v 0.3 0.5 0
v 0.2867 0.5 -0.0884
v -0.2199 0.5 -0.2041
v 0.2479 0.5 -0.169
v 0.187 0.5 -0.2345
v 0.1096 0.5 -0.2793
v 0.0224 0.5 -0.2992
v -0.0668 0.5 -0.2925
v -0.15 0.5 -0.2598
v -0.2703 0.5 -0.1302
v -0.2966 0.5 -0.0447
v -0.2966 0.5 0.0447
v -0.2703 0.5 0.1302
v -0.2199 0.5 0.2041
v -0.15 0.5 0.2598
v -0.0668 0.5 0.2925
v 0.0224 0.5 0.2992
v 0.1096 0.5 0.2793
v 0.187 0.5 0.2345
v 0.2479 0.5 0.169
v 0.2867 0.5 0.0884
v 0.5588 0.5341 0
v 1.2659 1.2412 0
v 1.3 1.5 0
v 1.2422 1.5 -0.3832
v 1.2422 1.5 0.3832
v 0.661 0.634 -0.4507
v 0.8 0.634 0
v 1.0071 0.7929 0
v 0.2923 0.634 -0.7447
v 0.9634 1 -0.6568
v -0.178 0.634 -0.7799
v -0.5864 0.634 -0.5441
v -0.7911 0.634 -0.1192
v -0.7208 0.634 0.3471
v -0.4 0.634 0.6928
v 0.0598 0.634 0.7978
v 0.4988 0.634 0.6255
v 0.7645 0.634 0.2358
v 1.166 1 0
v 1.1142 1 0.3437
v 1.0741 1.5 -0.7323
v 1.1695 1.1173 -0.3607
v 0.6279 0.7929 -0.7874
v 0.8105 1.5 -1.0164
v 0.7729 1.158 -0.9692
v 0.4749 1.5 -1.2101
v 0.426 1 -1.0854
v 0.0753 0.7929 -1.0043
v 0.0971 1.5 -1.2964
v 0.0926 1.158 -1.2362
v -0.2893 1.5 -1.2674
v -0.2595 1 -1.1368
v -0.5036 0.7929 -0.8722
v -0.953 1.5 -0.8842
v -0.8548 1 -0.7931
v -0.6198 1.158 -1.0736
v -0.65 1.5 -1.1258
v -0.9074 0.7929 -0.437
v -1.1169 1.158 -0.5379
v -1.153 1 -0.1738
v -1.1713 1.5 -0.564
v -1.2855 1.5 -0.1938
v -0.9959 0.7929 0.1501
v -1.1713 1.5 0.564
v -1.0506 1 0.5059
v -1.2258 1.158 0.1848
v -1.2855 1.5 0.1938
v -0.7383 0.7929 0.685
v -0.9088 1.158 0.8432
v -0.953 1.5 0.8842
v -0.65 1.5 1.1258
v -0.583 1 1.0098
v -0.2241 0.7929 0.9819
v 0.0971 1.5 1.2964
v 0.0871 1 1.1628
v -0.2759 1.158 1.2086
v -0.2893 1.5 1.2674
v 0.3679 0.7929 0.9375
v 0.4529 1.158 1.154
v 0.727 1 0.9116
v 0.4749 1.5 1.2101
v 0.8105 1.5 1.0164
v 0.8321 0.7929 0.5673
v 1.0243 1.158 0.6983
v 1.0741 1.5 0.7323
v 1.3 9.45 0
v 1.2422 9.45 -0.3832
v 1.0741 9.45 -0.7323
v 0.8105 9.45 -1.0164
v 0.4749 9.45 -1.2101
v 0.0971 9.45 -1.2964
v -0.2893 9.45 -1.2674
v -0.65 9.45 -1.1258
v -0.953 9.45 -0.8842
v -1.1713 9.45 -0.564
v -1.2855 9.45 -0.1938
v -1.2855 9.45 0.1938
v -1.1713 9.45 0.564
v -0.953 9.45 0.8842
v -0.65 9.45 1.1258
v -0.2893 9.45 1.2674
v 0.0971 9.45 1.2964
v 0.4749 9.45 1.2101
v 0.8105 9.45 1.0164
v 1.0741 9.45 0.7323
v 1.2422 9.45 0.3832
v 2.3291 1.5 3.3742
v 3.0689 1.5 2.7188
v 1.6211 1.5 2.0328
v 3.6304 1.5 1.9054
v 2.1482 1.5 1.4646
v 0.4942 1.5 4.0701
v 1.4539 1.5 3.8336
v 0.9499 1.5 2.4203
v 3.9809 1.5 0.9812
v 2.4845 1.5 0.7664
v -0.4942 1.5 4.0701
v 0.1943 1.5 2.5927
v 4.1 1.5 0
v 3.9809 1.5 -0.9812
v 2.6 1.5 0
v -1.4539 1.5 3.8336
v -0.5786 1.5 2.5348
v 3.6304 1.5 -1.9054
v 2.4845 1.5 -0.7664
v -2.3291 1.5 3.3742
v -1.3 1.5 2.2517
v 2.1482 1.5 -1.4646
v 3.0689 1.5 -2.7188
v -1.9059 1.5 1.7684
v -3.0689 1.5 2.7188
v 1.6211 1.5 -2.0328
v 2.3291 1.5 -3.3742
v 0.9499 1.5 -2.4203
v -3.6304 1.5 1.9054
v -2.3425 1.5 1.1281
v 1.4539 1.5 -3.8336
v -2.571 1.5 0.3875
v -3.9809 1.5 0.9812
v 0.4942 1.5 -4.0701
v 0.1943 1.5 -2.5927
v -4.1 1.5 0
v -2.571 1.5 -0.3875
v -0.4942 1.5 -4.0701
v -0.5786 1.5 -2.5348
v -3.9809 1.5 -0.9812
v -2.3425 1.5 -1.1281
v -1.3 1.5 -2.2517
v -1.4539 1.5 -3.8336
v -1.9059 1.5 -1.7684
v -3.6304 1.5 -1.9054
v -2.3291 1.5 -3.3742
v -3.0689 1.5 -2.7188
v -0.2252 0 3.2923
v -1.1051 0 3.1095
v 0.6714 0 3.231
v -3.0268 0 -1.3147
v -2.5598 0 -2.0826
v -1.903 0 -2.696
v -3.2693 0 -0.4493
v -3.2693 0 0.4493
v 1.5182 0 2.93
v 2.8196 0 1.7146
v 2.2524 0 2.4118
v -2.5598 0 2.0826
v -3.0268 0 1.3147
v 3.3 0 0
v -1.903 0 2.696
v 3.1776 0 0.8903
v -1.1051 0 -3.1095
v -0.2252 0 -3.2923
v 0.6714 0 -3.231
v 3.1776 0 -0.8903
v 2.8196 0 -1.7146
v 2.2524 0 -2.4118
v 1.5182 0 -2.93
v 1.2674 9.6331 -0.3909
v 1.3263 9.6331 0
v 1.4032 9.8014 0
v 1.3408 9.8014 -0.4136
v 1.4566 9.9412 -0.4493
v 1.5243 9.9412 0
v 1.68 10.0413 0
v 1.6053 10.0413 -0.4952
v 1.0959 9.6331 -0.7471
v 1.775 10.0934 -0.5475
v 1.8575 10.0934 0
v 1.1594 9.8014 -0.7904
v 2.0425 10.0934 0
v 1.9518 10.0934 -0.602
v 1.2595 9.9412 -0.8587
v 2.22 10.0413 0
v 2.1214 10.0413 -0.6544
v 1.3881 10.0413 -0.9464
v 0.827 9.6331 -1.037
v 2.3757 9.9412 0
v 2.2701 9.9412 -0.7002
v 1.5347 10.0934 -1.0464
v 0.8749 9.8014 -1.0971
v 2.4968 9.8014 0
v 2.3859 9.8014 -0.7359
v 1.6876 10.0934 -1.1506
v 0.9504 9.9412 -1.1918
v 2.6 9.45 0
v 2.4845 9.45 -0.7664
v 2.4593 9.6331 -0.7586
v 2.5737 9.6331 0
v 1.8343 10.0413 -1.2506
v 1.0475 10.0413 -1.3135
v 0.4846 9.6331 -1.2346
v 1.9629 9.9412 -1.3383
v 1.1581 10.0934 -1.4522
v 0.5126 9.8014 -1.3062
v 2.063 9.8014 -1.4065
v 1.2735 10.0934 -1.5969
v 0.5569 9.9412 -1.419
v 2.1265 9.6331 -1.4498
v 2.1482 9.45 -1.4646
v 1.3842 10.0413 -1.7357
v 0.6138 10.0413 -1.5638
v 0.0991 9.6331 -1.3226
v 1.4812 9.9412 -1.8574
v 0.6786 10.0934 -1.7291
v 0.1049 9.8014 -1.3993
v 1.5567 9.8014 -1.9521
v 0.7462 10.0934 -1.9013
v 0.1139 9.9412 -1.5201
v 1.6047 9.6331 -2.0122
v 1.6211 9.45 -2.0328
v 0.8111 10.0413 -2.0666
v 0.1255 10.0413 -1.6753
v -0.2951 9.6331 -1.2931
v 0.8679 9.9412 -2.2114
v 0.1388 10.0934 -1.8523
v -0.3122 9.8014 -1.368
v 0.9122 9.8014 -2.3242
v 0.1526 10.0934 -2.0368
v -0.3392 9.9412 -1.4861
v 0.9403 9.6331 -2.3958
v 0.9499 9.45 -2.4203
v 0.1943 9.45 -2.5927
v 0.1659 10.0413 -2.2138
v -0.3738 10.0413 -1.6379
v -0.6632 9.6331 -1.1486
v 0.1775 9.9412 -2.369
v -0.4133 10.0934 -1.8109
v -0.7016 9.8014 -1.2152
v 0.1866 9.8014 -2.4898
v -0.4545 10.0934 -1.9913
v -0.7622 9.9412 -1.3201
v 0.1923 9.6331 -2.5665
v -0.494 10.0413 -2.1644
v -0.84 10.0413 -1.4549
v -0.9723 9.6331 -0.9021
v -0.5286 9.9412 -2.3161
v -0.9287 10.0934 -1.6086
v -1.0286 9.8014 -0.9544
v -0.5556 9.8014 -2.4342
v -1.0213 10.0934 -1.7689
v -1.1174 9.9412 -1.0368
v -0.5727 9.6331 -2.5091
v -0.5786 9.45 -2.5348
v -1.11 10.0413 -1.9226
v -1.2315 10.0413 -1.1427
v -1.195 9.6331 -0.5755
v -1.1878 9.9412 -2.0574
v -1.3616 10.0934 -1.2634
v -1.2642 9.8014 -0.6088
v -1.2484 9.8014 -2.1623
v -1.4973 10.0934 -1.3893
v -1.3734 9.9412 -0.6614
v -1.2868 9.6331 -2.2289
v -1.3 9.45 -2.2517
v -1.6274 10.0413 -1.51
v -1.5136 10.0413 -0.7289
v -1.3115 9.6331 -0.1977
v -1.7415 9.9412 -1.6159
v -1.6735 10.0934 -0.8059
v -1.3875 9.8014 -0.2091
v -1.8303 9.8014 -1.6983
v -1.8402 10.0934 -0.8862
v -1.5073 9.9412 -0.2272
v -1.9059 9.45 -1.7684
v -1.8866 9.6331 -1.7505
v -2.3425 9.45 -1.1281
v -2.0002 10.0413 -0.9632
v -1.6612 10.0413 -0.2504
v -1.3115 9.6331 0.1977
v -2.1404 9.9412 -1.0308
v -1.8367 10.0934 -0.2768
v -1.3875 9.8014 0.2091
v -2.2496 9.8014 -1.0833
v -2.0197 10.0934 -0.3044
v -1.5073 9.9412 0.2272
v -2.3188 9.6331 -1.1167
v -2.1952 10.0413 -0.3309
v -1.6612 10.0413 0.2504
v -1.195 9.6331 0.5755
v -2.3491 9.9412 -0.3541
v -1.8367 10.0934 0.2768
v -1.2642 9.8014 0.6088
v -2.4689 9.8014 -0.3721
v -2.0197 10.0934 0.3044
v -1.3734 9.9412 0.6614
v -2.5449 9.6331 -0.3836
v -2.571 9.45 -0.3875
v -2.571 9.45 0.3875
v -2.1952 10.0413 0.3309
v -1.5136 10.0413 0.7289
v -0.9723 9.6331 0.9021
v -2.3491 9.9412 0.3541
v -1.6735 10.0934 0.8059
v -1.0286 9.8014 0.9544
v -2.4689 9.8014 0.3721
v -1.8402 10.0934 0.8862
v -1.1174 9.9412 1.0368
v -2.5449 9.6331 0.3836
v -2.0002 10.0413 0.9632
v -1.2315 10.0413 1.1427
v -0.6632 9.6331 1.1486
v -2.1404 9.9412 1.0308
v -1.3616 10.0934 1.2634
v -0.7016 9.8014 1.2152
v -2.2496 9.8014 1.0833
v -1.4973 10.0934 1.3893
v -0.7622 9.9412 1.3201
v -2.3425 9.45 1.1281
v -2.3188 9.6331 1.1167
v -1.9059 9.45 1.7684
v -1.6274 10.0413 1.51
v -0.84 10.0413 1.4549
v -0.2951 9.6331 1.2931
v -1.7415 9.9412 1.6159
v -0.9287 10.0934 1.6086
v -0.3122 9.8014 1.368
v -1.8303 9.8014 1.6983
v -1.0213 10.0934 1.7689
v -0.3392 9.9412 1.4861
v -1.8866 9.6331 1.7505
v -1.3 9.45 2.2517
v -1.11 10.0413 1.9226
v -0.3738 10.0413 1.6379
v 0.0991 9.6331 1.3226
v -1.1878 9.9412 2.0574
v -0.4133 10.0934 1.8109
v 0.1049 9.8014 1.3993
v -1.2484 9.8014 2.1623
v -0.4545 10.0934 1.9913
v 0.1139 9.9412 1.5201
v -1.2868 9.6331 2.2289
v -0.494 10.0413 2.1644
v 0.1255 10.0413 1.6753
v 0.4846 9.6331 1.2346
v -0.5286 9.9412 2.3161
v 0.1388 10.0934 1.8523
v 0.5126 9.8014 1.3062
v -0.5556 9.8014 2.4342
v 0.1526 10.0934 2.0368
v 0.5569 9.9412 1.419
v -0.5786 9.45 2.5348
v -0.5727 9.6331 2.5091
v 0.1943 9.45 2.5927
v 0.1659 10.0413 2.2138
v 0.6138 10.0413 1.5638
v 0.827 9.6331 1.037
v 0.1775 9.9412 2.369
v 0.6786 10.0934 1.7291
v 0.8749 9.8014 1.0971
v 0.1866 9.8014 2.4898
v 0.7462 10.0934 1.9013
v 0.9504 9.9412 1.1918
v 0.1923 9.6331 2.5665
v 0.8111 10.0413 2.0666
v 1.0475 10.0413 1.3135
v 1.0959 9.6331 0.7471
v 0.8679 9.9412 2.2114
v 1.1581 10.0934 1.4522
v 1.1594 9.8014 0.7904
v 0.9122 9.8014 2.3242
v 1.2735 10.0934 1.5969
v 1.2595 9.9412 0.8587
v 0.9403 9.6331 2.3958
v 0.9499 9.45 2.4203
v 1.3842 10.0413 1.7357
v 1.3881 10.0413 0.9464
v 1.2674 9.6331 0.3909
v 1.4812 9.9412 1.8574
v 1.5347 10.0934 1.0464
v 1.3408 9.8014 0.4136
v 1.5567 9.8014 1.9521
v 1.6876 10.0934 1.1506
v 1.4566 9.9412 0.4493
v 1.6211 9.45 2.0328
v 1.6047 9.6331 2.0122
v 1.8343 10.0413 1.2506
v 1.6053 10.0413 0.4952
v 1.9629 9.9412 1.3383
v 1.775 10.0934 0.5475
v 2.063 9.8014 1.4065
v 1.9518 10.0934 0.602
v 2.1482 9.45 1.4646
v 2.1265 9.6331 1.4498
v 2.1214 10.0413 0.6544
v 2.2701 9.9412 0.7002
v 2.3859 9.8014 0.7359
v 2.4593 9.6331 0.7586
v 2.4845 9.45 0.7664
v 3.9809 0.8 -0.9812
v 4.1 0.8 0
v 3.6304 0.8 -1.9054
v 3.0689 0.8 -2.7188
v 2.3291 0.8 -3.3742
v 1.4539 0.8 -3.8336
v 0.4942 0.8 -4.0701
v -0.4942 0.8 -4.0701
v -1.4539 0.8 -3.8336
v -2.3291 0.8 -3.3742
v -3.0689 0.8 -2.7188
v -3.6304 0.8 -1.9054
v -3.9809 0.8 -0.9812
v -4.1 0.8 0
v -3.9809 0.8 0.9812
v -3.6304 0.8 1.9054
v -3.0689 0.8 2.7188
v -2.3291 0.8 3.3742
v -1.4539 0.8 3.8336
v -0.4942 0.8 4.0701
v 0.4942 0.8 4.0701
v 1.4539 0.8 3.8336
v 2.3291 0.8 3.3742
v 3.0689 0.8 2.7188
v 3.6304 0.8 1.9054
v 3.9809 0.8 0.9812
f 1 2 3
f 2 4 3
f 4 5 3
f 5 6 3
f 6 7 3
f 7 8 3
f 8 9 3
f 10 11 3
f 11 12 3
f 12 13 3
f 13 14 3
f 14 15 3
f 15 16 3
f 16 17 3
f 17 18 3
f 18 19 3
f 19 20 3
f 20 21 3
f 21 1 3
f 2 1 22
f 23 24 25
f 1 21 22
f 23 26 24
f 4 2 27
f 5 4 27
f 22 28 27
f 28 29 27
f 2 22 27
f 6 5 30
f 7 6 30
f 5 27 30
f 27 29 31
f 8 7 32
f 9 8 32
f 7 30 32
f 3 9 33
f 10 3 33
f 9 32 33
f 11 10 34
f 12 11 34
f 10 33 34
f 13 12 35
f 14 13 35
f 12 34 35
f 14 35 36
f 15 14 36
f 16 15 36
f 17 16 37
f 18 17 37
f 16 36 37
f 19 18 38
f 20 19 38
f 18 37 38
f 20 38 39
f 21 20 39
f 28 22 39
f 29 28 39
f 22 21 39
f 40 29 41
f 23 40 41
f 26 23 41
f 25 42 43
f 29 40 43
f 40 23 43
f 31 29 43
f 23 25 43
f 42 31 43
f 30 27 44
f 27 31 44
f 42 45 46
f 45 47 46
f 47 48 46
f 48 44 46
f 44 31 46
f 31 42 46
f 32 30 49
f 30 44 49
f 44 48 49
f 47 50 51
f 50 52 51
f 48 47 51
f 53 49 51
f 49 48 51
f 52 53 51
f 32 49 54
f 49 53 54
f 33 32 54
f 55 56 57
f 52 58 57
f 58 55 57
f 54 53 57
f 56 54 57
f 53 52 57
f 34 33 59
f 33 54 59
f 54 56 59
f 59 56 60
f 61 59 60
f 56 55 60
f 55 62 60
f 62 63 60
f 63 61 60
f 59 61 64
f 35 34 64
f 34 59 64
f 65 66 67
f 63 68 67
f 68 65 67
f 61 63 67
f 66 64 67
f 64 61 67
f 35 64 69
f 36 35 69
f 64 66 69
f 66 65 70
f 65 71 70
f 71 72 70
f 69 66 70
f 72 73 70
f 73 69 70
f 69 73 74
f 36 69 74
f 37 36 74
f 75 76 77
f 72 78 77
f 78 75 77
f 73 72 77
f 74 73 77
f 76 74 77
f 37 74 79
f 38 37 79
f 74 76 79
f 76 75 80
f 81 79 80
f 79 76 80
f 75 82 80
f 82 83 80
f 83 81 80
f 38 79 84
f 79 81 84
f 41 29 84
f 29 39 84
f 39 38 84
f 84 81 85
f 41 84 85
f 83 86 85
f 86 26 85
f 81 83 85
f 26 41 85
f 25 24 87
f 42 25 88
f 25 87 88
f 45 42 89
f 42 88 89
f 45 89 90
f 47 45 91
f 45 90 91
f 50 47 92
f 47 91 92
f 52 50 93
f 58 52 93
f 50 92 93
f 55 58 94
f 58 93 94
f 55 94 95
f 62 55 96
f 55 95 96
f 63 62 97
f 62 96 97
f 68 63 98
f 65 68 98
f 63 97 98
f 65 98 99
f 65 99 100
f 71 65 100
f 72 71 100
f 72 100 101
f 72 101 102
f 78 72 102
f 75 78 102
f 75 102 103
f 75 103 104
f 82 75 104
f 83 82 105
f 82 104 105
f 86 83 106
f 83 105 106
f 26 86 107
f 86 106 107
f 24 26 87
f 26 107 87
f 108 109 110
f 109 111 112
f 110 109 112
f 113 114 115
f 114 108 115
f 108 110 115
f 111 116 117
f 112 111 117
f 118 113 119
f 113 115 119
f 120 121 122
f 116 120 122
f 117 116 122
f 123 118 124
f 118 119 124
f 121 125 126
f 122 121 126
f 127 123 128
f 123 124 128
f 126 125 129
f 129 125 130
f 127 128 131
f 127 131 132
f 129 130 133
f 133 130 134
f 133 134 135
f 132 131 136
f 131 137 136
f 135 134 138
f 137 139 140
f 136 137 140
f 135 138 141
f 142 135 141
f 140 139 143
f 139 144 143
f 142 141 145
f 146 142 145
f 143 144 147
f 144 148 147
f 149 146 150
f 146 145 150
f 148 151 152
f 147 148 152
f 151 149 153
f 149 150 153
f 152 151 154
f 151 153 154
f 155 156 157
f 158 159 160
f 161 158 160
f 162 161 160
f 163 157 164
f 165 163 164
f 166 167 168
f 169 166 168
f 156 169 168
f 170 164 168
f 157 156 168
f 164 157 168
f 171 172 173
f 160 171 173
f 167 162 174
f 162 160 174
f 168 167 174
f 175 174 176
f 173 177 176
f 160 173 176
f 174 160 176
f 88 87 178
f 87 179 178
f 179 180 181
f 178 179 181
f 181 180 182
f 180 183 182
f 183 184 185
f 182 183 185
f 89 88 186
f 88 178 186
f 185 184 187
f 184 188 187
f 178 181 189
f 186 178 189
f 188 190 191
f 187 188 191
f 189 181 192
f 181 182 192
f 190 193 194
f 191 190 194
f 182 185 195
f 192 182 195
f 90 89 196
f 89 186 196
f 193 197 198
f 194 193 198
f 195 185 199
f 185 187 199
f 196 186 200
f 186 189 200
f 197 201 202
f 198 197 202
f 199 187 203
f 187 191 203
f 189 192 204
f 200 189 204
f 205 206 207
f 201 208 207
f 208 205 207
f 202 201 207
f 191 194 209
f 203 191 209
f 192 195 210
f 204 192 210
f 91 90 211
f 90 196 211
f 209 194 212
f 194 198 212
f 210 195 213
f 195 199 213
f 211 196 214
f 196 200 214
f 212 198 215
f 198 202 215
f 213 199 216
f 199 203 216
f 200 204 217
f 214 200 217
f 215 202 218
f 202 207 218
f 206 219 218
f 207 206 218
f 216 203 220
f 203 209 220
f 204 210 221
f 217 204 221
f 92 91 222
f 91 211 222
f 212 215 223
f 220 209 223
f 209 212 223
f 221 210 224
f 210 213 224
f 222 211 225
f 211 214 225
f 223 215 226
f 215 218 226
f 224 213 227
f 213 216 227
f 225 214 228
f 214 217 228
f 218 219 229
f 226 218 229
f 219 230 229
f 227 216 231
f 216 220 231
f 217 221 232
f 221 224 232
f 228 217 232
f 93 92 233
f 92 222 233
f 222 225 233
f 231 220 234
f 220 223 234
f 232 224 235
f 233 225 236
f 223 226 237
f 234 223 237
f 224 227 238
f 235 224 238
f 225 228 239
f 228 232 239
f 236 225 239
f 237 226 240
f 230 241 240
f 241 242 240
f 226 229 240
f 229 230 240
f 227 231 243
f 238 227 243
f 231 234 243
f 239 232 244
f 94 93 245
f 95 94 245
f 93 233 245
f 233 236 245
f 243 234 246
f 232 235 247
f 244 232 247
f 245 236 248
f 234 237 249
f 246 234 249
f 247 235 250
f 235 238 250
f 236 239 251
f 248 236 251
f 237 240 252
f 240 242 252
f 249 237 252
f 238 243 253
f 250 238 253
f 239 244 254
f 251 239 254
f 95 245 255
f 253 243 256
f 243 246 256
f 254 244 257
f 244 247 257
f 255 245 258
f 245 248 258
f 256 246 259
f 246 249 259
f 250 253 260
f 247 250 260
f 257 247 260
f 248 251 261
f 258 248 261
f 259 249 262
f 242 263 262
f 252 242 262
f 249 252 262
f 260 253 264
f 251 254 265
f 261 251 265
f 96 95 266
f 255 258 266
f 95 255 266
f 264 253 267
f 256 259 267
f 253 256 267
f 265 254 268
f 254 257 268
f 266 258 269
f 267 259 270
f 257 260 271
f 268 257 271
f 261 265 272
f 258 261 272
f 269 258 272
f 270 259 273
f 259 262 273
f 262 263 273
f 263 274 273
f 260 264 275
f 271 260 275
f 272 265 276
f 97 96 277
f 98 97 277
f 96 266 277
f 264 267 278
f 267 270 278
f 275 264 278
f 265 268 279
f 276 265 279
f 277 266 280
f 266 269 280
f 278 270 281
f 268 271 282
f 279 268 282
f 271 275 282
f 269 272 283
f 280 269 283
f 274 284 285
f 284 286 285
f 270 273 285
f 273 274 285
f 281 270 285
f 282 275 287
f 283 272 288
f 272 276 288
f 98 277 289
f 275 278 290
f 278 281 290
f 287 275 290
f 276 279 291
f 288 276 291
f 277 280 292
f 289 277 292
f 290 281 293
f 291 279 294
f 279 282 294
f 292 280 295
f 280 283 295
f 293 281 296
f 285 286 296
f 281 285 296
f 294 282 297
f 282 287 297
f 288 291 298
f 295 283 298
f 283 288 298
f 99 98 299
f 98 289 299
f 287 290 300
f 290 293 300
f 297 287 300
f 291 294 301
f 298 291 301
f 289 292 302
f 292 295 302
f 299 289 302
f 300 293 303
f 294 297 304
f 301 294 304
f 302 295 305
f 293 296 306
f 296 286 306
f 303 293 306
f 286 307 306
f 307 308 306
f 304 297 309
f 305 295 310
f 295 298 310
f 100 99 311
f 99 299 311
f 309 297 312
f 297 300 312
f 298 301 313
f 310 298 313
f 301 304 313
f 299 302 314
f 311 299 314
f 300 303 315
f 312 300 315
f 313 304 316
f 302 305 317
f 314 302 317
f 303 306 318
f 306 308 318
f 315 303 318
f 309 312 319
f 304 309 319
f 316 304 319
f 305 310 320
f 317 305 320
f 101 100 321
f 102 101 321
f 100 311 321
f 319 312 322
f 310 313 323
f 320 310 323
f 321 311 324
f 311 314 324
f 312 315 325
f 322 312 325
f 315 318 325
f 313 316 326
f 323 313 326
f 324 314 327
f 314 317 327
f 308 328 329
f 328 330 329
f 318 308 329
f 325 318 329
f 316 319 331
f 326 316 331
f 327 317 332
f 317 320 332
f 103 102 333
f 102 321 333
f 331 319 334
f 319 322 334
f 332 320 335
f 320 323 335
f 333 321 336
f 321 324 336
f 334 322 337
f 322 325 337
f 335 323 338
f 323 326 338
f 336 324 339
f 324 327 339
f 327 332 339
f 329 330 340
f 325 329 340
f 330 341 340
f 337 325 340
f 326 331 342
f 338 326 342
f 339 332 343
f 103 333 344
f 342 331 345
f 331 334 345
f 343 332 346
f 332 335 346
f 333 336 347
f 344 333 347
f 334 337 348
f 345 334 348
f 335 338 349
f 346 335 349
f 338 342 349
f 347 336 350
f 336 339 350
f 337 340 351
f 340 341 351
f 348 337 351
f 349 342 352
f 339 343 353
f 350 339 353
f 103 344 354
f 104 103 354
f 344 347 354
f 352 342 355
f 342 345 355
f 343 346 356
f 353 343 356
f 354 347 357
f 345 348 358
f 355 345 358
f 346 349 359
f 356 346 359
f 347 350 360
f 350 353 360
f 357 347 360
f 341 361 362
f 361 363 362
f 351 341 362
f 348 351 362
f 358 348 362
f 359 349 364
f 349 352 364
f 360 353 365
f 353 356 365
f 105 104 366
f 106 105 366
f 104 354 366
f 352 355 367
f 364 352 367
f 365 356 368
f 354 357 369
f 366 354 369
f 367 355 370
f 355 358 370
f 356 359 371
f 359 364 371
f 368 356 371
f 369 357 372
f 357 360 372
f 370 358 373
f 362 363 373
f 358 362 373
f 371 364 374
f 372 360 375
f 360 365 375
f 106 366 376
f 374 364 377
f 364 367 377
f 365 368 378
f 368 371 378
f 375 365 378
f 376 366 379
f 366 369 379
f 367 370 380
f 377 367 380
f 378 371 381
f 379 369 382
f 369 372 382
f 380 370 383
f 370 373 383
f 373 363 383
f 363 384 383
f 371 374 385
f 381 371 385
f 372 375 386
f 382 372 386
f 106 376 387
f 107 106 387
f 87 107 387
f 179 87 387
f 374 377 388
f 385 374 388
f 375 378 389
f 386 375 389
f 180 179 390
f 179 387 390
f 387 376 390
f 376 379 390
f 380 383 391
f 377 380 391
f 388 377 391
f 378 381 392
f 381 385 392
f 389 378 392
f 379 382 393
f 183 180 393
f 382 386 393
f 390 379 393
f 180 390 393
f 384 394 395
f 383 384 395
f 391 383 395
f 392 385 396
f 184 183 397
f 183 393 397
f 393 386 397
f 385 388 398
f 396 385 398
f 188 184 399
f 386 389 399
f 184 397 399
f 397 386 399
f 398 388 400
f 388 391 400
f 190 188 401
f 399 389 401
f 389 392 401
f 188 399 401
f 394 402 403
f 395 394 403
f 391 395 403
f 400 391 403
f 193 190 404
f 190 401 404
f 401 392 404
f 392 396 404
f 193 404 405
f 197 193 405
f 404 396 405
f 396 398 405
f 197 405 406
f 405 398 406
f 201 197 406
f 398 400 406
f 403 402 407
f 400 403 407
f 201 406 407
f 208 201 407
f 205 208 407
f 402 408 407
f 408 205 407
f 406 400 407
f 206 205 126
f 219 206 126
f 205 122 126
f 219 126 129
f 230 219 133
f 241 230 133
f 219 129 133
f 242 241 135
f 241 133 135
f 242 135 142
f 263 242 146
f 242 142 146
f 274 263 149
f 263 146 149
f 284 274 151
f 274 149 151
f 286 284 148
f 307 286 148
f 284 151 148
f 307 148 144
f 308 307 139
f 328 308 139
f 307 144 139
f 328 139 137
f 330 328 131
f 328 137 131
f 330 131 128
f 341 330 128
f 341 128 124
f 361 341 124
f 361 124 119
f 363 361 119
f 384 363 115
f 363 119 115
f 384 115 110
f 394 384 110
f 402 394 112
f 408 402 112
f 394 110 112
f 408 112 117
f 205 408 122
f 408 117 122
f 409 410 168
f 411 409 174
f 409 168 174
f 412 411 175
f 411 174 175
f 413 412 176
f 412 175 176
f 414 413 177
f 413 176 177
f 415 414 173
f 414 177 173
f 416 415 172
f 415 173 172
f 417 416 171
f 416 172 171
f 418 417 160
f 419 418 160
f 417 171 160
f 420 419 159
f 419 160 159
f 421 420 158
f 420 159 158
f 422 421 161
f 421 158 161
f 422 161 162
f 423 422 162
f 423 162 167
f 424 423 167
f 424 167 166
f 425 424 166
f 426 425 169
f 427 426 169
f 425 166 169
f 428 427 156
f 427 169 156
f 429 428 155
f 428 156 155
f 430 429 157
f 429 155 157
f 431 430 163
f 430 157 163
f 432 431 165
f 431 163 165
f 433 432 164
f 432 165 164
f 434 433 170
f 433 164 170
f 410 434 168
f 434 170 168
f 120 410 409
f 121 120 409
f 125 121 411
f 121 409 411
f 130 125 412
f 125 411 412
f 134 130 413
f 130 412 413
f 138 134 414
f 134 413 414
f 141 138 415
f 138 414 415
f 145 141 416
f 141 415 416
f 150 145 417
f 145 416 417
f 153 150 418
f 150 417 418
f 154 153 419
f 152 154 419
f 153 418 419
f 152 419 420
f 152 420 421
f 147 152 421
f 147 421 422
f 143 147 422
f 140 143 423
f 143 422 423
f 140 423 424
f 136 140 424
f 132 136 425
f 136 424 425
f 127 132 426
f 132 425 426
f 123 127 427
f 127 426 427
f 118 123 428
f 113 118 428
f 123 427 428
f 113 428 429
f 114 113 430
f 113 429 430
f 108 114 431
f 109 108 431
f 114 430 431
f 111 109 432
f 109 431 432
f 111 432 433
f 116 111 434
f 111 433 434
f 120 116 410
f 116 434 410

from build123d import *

# Parameters (mm, degrees)
CHAMFER1_SIZE = 0.8


with BuildPart() as part:
    # Sketch1 → Revolve1 (revolve)
    with BuildSketch(Plane.XY, mode=Mode.PRIVATE) as revolve1_sk:
        with BuildLine():
            Line((0, 0), (0, 0.5))
            Line((0, 0.5), (-0.3, 0.5))
            ThreePointArc((-0.3, 0.5), (-1.007106781, 0.792893219), (-1.3, 1.5))
            Line((-1.3, 1.5), (-1.3, 9.45))
            ThreePointArc((-1.3, 9.45), (-1.95, 10.1), (-2.6, 9.45))
            Line((-2.6, 9.45), (-2.6, 1.5))
            Line((-2.6, 1.5), (-4.1, 1.5))
            Line((-4.1, 1.5), (-4.1, 0))
            Line((-4.1, 0), (0, 0))
        make_face()
    revolve(revolve1_sk.sketch.rotate(Axis((0, -1000, 0), (0, 1, 0)), 180), axis=Axis((0, -1000, 0), (0, 1, 0)))

    # Chamfer1
    chamfer1_edges = [part.edges().sort_by_distance(p)[0] for p in [
        (-4.1, 0, 0),
    ]]
    chamfer(chamfer1_edges, length=CHAMFER1_SIZE)


solid = part.part
